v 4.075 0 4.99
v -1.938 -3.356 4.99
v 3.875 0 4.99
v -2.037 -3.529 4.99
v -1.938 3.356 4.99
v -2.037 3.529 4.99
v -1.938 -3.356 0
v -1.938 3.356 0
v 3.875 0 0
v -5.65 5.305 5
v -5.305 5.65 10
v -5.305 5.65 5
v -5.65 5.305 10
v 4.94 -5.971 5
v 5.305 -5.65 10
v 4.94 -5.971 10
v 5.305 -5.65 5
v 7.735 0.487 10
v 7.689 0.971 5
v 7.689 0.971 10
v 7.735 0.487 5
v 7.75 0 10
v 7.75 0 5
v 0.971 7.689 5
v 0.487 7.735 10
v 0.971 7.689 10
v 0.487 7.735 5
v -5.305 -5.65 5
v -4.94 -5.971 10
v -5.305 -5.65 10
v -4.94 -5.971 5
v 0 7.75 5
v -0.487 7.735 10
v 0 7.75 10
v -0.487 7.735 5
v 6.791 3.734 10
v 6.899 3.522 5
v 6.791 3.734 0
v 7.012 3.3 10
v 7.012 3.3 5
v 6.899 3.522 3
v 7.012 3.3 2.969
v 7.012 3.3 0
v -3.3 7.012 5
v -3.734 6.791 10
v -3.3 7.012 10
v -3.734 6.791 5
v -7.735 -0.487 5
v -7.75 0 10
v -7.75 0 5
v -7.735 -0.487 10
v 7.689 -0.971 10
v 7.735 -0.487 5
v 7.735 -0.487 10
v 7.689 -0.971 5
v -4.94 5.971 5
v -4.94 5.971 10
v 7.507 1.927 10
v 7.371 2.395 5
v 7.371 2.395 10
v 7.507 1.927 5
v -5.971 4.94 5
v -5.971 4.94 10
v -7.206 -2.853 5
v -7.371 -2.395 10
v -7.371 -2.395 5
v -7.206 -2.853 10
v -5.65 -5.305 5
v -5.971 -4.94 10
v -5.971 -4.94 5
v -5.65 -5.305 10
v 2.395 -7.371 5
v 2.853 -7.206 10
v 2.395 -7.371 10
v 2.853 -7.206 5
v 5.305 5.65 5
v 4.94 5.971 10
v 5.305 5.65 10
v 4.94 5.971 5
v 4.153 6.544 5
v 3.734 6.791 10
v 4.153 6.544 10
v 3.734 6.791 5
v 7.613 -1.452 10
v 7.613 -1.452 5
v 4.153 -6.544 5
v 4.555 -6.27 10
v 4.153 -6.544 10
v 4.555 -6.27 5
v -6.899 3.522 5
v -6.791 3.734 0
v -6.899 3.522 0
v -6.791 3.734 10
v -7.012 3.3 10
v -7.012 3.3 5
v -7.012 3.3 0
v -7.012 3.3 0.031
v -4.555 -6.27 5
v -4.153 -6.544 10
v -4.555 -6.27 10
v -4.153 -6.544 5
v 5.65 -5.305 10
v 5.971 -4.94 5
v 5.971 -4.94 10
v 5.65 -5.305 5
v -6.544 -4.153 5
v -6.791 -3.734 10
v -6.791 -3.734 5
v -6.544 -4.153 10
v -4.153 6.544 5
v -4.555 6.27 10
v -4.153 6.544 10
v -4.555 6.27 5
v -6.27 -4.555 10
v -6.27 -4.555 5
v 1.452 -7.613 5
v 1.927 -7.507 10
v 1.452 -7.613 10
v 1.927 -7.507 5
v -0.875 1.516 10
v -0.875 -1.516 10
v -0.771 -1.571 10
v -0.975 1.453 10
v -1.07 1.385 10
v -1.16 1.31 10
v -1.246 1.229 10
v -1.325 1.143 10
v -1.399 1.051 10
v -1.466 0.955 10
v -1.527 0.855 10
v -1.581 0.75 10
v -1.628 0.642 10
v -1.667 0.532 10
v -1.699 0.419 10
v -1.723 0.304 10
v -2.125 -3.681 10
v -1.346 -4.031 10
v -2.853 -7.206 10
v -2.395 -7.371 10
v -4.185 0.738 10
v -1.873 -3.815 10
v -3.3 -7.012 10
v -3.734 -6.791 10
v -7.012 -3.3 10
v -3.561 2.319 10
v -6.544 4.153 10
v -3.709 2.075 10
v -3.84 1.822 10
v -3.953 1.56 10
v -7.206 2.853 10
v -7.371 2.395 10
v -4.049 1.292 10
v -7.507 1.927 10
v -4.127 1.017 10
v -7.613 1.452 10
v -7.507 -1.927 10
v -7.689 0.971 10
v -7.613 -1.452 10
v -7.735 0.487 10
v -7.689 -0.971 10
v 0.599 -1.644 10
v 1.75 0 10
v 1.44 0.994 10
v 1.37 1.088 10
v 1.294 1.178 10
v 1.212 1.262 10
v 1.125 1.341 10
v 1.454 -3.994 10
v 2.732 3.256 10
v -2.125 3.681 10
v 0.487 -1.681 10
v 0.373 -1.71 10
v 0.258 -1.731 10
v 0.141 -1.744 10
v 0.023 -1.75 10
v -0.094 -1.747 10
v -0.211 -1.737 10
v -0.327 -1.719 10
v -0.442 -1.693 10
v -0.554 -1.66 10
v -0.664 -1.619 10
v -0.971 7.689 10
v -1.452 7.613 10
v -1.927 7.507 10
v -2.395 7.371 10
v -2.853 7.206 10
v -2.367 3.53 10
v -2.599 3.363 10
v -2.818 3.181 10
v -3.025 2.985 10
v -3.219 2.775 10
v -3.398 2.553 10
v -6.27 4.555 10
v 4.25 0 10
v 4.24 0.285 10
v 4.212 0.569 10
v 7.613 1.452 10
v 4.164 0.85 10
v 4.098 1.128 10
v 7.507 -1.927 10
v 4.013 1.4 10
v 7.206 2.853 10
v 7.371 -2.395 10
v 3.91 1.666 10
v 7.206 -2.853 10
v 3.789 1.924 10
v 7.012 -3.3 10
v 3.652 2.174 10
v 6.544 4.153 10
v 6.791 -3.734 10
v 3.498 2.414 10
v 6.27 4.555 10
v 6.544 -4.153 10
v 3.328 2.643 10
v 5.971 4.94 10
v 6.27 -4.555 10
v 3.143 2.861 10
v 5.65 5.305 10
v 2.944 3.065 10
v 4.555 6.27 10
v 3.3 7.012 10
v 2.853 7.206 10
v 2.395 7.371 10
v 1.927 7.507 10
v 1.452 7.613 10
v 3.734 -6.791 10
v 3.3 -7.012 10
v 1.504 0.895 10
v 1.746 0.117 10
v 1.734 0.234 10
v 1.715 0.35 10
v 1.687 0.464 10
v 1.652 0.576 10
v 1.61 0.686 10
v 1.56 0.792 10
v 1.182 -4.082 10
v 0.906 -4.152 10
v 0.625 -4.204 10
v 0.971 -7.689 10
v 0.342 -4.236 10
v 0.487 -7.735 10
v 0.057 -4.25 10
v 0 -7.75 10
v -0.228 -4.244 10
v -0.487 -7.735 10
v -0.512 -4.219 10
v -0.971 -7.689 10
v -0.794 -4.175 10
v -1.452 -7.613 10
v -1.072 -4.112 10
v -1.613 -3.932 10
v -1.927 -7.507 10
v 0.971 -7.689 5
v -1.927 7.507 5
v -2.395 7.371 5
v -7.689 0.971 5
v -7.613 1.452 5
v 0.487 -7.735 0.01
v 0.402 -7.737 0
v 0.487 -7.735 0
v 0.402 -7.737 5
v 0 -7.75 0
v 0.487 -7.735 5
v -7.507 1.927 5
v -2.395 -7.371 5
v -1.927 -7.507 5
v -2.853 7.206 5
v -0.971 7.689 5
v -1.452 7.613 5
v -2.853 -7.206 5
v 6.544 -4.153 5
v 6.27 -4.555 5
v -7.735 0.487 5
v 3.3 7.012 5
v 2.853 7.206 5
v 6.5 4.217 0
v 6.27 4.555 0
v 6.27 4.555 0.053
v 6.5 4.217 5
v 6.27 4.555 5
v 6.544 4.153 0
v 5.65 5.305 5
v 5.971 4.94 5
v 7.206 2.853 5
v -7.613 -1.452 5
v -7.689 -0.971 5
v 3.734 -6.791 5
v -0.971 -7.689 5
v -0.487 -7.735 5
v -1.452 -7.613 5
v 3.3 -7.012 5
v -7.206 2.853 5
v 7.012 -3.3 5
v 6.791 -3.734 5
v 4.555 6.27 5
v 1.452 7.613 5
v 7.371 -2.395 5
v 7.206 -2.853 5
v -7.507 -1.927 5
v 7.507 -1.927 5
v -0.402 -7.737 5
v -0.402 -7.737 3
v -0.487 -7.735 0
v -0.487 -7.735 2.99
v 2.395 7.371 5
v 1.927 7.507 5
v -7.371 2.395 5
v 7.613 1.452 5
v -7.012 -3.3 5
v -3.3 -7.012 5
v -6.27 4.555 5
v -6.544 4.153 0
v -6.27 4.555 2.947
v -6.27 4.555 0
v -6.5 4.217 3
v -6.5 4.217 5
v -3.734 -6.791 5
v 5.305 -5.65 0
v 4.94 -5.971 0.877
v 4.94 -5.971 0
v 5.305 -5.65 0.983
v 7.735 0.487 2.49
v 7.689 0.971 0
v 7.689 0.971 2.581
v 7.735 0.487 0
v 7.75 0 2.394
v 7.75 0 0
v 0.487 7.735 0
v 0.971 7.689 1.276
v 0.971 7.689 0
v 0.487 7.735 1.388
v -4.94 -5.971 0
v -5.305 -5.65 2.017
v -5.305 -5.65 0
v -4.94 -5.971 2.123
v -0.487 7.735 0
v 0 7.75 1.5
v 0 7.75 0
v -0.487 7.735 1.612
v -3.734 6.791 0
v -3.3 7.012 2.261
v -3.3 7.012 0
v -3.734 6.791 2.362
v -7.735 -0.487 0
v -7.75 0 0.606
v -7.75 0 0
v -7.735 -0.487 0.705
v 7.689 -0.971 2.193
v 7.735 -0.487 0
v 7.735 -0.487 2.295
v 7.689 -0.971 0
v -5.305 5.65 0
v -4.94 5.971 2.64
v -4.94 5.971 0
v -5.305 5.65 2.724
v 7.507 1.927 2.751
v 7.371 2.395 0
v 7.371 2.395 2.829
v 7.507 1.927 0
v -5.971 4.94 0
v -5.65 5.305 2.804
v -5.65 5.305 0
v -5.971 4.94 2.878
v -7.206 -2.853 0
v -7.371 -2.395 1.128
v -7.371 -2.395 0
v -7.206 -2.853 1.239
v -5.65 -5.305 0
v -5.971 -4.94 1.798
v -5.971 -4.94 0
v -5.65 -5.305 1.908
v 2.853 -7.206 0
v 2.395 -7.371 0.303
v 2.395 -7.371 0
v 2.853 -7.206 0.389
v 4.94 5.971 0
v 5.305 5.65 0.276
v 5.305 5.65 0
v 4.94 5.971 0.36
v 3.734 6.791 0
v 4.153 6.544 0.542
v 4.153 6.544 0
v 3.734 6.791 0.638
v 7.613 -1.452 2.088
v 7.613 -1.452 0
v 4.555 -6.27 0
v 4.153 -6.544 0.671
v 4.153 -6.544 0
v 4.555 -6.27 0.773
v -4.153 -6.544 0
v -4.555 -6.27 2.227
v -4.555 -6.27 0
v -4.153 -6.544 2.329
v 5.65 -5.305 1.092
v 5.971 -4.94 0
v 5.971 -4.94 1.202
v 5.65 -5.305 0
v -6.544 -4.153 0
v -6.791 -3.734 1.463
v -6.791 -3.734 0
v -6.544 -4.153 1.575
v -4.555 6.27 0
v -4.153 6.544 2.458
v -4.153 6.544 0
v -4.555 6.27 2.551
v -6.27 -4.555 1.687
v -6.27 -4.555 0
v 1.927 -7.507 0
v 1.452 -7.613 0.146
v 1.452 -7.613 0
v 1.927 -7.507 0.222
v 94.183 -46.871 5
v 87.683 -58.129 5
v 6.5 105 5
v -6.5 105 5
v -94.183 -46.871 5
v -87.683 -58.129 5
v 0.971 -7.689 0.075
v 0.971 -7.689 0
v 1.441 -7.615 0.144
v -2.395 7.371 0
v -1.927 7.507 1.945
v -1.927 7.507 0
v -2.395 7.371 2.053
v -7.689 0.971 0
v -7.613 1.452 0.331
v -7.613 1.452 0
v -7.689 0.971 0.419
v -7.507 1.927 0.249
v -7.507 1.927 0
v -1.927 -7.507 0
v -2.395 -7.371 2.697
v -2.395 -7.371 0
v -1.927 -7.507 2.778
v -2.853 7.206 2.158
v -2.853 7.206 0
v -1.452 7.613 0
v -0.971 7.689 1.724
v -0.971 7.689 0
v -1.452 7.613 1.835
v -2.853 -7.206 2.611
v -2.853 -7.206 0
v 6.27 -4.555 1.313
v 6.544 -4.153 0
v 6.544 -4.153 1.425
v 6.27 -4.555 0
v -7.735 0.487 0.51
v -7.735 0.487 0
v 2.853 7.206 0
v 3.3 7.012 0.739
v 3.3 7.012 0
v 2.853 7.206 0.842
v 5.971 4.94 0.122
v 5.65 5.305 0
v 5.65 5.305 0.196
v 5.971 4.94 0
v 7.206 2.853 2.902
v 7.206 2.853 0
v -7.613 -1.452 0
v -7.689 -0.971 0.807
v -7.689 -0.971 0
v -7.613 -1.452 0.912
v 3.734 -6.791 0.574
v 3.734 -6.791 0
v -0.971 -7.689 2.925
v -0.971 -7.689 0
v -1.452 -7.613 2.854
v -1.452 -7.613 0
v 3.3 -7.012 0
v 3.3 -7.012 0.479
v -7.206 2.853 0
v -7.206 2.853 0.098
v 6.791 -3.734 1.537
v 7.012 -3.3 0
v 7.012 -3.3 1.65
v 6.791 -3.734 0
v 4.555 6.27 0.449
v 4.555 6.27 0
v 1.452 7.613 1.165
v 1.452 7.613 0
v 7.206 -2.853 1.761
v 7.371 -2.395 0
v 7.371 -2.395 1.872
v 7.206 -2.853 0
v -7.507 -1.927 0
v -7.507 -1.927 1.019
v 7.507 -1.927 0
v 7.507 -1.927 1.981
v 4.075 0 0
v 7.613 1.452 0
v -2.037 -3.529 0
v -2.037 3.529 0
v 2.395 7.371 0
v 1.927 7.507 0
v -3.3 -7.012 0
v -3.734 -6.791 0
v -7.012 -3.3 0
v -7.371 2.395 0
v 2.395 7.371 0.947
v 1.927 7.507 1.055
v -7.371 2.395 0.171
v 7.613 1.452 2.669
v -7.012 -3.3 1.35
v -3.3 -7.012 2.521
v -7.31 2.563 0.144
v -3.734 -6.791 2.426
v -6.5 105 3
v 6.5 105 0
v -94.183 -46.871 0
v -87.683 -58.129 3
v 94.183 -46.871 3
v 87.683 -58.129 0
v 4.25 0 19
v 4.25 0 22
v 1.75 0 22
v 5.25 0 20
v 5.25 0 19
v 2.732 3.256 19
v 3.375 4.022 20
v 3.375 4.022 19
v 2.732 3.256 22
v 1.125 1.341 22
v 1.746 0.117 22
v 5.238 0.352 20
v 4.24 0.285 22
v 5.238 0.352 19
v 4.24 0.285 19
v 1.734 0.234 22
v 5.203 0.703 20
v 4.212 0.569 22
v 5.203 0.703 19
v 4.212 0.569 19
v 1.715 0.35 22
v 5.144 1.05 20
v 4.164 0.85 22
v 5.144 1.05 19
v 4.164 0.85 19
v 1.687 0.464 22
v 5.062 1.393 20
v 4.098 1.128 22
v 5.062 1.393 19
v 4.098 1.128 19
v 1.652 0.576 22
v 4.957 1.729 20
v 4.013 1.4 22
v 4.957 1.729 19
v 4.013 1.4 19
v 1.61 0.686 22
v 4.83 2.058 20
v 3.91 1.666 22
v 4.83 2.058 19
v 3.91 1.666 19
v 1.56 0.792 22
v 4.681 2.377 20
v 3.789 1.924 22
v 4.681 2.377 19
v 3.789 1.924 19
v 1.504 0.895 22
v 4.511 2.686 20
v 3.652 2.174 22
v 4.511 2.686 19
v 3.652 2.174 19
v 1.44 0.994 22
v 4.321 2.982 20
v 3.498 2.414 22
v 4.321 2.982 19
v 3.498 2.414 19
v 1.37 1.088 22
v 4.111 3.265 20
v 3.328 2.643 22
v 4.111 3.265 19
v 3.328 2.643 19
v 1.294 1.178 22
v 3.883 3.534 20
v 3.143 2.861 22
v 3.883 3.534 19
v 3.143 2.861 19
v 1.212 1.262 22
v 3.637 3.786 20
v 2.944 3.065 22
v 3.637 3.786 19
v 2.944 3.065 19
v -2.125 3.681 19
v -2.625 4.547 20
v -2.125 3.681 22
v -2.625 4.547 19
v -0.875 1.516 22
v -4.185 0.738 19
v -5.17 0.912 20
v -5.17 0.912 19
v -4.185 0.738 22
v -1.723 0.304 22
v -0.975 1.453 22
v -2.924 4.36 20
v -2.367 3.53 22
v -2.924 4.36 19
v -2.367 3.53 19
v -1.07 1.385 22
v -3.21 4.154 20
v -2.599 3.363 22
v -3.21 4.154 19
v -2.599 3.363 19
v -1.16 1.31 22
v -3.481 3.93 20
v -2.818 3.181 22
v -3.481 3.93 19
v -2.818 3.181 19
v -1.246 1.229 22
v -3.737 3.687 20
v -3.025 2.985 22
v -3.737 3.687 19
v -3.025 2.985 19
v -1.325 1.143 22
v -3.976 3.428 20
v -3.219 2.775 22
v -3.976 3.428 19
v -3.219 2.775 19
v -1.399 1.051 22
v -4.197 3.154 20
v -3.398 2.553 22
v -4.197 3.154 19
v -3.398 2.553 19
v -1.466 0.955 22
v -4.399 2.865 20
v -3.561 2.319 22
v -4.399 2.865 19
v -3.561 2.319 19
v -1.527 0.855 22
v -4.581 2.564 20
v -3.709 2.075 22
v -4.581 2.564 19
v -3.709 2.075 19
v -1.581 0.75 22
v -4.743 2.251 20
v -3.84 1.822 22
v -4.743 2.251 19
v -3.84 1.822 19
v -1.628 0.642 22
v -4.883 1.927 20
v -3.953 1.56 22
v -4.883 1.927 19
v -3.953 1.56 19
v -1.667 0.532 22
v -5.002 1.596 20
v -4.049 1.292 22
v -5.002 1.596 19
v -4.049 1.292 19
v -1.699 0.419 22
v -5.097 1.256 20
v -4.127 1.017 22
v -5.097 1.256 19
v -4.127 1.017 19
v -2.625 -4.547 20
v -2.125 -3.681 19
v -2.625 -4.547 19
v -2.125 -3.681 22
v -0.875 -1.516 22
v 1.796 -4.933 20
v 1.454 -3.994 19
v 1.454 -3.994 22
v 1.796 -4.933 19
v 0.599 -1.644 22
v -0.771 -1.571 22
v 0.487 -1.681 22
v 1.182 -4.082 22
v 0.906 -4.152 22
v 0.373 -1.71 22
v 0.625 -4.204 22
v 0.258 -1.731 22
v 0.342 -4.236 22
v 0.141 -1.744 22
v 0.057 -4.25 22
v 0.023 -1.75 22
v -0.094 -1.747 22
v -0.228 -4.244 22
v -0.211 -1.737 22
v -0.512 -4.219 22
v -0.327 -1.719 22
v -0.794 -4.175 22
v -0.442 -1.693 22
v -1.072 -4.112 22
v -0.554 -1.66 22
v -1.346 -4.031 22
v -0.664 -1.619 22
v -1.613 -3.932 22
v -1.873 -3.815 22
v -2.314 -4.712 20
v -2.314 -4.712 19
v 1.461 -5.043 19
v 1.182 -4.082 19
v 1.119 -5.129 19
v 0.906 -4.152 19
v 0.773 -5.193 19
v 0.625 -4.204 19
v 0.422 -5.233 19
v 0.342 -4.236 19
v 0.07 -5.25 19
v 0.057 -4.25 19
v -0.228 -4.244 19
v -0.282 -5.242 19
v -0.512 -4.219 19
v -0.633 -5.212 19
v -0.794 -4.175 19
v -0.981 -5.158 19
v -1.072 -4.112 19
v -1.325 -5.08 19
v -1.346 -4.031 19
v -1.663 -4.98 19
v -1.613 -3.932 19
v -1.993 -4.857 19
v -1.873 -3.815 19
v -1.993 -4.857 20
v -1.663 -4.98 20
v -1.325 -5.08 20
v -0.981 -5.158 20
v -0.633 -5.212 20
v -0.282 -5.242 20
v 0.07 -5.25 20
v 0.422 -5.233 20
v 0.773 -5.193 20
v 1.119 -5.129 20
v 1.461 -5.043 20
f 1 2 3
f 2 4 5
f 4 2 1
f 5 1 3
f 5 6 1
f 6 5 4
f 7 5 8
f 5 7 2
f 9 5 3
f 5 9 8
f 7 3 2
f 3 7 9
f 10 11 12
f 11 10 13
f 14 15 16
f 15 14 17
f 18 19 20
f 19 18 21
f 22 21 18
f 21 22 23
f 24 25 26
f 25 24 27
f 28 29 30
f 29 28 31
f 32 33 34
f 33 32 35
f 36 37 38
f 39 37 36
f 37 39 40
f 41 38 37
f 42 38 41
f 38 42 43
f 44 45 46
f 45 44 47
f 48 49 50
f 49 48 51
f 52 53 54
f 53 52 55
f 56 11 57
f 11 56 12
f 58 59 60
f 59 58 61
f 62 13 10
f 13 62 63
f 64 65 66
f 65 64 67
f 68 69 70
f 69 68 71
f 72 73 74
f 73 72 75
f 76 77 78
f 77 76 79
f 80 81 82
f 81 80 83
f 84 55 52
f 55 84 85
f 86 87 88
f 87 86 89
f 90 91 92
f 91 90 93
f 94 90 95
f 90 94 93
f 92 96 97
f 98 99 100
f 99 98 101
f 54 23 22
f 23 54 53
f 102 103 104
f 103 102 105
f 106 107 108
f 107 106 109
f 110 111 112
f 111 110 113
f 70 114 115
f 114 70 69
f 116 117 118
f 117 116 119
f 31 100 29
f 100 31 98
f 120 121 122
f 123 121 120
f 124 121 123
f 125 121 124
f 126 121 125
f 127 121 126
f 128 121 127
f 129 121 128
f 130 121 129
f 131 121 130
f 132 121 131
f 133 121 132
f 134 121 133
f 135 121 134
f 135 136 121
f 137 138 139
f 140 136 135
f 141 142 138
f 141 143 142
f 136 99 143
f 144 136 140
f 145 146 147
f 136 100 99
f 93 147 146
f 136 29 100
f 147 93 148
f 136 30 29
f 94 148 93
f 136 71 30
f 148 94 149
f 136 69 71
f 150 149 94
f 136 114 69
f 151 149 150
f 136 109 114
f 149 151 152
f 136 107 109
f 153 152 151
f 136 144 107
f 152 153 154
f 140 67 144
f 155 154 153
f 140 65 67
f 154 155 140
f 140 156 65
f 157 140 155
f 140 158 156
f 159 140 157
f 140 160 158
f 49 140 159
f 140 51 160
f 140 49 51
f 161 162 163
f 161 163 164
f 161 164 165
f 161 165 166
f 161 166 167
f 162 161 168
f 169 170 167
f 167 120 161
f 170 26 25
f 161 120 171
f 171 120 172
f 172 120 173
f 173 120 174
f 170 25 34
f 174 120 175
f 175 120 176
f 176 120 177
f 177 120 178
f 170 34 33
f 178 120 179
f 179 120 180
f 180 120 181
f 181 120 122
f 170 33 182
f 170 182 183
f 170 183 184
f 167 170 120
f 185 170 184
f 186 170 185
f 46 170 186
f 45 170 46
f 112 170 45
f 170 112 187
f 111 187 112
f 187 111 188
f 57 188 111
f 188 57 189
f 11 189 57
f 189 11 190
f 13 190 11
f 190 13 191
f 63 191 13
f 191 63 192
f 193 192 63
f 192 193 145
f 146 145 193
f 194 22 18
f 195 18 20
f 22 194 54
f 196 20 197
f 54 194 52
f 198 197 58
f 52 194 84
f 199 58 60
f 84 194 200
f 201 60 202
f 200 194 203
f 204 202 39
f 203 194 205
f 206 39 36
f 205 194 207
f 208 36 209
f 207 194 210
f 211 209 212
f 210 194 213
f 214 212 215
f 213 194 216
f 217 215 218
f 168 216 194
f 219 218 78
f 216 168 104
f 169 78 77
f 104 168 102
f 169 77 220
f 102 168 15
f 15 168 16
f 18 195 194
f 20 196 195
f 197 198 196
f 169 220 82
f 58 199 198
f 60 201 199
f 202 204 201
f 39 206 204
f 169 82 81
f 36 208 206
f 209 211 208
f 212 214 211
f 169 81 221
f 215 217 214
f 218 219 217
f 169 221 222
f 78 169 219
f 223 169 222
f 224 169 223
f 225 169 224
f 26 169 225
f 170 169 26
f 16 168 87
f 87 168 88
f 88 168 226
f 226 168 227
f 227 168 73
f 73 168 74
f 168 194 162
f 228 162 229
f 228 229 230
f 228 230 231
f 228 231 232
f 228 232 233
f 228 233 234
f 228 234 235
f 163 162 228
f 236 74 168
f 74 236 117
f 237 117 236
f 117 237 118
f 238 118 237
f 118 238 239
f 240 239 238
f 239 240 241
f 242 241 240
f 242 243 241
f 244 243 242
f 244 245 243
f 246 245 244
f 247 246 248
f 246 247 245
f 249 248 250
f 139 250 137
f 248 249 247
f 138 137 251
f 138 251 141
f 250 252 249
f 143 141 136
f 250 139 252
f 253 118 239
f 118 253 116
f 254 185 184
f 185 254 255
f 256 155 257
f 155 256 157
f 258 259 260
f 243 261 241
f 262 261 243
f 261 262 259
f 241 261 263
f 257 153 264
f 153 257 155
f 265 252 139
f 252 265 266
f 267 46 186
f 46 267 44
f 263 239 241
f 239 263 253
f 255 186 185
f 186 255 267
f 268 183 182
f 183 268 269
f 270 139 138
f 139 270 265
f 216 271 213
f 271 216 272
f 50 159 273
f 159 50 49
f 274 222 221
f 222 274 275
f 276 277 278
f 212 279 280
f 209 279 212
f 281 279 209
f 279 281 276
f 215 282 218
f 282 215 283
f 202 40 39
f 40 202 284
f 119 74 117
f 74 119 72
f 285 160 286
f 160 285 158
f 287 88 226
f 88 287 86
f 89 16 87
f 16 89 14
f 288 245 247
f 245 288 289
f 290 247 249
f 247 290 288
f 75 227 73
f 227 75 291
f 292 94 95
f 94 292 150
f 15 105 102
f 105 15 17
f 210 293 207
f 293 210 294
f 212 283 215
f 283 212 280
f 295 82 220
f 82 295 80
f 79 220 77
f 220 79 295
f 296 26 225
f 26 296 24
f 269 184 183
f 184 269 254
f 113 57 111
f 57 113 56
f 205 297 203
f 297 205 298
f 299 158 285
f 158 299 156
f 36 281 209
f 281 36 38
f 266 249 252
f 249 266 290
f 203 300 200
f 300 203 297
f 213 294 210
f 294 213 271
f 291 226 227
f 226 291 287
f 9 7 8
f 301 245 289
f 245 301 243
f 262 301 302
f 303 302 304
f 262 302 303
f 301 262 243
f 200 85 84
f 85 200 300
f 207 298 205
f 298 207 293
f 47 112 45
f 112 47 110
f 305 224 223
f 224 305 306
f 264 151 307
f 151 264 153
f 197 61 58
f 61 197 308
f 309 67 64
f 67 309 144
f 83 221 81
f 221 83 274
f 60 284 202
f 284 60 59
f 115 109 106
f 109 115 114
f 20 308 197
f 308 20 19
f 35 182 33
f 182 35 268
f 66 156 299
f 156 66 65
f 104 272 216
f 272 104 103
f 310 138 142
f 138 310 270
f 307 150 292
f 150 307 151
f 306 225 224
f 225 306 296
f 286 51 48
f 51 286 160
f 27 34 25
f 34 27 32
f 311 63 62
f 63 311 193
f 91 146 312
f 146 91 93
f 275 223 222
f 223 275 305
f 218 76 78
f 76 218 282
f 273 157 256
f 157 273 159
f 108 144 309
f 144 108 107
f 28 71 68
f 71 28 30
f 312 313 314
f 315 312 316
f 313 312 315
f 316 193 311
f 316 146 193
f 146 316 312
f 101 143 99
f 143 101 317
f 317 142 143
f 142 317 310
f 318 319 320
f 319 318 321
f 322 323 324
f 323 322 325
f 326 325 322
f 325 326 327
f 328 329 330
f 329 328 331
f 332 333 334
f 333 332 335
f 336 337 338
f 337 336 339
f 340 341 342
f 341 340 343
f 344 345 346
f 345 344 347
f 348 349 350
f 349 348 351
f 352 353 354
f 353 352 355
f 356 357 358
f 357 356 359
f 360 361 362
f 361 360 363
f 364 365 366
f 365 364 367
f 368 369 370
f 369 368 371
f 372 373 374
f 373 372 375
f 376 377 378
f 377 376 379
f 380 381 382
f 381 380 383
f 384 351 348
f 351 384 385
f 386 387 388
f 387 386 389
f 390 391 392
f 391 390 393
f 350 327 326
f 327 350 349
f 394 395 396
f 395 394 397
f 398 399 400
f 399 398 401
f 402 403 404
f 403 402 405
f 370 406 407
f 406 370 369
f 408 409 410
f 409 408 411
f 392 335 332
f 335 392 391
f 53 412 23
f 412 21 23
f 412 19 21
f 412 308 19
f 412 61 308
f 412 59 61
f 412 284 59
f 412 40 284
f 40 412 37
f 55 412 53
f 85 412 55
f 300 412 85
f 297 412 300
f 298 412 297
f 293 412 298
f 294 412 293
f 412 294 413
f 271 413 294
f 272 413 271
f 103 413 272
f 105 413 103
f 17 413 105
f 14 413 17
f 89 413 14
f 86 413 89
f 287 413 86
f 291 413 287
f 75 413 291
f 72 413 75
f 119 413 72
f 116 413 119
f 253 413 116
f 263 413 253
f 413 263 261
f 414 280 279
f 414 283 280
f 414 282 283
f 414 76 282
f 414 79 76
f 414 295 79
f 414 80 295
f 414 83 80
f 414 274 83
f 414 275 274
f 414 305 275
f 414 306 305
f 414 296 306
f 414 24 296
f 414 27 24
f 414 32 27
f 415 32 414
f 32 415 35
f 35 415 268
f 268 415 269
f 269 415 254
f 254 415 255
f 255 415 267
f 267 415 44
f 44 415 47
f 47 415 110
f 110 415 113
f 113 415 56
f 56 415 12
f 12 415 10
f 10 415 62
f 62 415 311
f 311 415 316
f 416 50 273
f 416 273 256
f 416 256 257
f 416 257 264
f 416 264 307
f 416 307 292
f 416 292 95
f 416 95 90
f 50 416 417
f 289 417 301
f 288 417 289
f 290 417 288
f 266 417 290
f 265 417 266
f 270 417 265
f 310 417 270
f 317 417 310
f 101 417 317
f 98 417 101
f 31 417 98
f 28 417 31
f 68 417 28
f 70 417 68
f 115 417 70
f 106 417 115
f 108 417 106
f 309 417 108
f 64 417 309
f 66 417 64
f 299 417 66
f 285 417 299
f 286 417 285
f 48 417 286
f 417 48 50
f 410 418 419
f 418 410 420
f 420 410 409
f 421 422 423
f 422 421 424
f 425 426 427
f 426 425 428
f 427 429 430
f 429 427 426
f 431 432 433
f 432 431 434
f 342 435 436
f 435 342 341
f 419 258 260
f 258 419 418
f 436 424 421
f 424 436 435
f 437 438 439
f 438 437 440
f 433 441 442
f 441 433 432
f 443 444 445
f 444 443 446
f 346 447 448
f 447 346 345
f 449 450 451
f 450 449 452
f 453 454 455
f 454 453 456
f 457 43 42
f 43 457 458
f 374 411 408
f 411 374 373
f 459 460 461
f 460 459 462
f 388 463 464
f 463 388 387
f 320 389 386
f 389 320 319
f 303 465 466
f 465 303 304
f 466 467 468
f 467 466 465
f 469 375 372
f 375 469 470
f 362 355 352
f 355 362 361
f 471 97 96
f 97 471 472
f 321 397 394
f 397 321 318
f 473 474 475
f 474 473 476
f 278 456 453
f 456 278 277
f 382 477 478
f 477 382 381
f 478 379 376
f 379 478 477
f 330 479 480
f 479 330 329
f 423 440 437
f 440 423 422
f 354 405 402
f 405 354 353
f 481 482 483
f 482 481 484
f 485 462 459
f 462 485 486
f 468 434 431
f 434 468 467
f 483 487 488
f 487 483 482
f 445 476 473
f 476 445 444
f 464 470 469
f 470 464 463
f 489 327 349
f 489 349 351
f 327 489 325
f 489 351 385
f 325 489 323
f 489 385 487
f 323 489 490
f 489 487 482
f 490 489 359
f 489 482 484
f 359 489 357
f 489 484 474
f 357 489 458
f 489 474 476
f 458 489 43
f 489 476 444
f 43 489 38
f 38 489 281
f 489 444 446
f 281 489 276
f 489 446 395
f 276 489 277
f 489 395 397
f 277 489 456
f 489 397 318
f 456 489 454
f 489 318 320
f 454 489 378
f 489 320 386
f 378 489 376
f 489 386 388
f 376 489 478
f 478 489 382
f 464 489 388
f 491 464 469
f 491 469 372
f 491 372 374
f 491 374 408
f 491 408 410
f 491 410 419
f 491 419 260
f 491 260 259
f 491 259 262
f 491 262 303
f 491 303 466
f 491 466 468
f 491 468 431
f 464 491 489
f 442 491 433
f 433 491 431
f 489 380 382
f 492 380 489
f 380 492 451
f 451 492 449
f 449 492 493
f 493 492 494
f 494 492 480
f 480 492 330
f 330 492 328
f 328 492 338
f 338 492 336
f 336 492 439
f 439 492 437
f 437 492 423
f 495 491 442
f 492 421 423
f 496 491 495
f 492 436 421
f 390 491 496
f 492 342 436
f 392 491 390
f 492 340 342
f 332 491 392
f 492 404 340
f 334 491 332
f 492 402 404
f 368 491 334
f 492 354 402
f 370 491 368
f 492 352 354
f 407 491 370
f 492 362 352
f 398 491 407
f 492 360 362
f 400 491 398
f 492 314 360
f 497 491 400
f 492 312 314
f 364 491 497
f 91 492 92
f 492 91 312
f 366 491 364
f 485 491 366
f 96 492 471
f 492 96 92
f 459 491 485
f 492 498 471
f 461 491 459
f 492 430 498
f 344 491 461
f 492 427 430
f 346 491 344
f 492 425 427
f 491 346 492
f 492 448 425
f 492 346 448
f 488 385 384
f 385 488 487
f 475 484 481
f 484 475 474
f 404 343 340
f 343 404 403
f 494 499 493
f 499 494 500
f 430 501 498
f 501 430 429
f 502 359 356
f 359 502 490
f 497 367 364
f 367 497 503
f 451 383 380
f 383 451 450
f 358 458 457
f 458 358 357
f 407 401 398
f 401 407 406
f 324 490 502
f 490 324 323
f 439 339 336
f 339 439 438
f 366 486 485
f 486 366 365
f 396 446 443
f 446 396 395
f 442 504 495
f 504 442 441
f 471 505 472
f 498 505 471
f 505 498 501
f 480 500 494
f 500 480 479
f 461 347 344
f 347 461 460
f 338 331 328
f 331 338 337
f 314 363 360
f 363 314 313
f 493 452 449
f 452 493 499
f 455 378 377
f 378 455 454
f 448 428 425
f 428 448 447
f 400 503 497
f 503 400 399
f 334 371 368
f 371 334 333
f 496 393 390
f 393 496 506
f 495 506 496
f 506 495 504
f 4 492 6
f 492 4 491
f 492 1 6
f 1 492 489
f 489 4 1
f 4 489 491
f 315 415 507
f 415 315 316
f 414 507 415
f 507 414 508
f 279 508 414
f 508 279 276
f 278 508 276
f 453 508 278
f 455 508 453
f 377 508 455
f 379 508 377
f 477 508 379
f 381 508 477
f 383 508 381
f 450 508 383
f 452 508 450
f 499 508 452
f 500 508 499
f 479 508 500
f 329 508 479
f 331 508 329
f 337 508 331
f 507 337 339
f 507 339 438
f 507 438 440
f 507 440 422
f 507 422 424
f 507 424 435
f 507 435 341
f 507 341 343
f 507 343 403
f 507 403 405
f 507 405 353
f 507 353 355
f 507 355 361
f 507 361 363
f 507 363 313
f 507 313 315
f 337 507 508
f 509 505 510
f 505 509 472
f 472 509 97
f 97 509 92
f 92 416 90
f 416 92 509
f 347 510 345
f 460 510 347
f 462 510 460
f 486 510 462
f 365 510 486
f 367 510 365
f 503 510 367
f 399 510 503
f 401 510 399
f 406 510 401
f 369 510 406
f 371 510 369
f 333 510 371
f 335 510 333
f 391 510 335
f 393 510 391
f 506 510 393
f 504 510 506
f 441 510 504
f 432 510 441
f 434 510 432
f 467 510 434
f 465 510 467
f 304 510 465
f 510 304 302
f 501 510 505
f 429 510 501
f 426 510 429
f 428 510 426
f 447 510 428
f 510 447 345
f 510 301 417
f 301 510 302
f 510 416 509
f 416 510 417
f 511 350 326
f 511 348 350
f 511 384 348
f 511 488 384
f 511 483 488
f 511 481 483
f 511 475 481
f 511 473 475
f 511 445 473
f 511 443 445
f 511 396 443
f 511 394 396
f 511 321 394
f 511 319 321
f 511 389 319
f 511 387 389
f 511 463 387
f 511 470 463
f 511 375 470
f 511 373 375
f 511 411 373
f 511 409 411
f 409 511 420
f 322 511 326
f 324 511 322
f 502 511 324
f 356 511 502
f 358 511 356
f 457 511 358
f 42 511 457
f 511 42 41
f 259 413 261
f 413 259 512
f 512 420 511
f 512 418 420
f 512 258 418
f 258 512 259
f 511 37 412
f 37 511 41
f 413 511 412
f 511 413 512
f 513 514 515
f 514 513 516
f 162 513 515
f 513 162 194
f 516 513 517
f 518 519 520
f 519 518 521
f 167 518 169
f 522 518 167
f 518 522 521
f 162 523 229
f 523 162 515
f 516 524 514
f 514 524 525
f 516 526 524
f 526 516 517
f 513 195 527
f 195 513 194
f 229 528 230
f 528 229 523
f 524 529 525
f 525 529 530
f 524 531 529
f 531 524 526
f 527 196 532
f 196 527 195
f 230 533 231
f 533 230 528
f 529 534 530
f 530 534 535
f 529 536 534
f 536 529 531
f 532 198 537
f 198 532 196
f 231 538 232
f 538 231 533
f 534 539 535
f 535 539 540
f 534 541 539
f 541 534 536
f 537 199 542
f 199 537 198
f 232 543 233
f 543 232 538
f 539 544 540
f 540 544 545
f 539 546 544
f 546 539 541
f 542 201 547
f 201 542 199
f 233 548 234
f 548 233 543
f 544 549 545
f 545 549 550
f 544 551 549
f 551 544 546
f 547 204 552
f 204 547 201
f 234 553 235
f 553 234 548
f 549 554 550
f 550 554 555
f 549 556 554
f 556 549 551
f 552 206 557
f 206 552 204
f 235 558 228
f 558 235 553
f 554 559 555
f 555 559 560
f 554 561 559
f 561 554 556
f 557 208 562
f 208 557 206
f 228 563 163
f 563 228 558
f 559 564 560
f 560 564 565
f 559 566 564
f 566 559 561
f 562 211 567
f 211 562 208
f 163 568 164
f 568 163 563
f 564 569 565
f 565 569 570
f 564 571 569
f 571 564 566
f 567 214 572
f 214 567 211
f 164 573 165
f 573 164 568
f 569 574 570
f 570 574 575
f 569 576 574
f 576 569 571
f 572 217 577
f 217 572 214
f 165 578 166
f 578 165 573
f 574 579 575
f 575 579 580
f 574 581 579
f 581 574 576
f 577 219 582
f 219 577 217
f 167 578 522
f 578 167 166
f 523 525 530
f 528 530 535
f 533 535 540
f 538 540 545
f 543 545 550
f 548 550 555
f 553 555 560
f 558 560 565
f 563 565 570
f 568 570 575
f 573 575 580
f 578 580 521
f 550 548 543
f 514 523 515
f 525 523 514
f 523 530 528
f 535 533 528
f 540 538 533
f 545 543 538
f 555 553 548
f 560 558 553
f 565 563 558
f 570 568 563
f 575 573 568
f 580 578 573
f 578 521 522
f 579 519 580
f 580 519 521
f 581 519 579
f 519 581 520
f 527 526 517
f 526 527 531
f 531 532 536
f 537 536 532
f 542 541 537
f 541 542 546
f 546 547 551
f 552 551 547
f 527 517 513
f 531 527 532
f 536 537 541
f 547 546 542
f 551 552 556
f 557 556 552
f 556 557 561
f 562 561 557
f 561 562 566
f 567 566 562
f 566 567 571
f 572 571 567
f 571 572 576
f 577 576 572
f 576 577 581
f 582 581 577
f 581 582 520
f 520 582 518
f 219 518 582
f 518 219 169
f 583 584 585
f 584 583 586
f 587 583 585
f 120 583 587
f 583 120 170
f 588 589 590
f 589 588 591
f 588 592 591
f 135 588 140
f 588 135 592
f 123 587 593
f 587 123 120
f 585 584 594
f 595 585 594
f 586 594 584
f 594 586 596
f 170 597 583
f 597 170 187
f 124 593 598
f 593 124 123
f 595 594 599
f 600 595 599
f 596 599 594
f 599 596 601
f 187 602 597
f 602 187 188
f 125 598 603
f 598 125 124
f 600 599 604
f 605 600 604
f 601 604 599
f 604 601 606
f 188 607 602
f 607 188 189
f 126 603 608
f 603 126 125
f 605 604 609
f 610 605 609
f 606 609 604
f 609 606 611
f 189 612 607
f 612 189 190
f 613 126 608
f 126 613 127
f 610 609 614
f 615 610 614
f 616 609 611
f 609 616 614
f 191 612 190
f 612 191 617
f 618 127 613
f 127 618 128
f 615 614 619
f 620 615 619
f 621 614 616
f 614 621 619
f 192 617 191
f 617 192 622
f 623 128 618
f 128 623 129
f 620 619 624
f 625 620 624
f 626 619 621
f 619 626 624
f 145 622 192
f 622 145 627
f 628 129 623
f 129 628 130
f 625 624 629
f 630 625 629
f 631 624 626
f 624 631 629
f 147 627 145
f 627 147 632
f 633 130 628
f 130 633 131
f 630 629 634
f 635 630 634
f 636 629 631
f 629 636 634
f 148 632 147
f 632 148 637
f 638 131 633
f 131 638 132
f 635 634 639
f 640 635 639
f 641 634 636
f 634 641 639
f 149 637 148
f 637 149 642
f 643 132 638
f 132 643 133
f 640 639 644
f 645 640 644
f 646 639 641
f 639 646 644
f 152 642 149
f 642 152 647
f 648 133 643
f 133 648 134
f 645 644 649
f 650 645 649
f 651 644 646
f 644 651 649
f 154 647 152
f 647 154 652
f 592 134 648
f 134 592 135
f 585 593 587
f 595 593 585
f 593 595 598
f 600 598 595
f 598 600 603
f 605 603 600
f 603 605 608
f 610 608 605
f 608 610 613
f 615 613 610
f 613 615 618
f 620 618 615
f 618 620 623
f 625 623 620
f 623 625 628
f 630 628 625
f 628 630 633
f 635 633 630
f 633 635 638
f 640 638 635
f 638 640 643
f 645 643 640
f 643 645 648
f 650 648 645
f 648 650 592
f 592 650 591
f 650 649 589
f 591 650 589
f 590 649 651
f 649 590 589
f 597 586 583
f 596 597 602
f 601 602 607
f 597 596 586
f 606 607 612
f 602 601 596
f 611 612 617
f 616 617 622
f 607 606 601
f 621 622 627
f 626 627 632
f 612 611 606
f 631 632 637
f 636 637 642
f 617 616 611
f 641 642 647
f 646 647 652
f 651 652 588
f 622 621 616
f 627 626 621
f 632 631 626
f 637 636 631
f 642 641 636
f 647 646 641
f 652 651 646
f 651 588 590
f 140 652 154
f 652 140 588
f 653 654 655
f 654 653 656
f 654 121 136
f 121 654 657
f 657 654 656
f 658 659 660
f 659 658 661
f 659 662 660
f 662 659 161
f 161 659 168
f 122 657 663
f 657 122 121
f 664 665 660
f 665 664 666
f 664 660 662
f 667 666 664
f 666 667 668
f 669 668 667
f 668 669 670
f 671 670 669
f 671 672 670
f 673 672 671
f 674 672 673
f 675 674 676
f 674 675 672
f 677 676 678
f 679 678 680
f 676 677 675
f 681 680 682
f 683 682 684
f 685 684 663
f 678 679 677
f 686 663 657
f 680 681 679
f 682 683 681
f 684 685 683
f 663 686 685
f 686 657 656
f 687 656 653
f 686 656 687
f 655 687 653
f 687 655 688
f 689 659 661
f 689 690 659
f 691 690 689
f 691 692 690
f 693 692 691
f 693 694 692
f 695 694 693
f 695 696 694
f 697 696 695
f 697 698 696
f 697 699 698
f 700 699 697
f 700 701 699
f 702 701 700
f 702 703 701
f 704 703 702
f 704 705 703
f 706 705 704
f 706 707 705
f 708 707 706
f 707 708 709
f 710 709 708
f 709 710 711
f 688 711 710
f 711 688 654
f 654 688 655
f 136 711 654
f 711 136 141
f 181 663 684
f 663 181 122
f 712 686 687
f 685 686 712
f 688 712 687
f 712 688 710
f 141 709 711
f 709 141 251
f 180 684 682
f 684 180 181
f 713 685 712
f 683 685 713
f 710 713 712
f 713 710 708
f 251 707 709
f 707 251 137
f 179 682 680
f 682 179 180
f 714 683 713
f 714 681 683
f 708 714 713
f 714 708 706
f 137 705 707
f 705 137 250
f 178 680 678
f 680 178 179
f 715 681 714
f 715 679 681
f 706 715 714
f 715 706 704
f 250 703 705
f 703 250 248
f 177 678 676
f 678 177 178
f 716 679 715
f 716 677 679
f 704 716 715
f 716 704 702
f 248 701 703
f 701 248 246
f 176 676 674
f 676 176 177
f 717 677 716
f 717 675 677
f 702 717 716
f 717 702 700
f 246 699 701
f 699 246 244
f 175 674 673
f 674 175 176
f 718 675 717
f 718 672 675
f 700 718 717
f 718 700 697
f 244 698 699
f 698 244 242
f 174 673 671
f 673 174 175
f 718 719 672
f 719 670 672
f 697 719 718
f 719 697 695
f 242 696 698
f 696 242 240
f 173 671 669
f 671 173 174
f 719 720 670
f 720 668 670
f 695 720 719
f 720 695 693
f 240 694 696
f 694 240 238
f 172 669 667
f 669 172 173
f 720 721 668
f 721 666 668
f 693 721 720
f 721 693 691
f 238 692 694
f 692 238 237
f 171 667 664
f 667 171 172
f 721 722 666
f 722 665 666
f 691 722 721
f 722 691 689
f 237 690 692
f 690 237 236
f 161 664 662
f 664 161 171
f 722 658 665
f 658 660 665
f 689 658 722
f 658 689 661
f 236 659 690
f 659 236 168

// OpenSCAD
$fn = 100;

insert_diameter = 8.5;
insert_wall = 2.5;
insert_notch = 3.5;
insert_notch_height = 3;
insert_height = 12;

insert_top = 15.5;
insert_top_height = 10;

blade_length = 105;
blade_width = 13;
blade_thick_1 = 5;
blade_thick_2 = 3;

difference(){
  cylinder(d=insert_top, h=insert_top_height);
  translate([0,0,-0.01]) {
    difference() {
      cylinder(d=insert_top+1, h=insert_top_height/2);
      cylinder(d=insert_top/2, h=insert_top_height/2, $fn=3);
    }
  }
}

module notch() {
translate([0, 0, insert_top_height])
rotate_extrude(angle=50)
translate([insert_diameter/2-insert_wall, 0, 0])
polygon([[0, 0], [0, insert_height], [insert_wall, insert_height], [insert_notch, insert_height-(insert_notch_height/1.5)], [insert_notch, insert_height-insert_notch_height], [insert_wall, insert_height-insert_notch_height], [insert_wall, 0]]);
}

notch();
rotate([0, 0, 120]) notch();
rotate([0, 0, 240]) notch();

module blade(rotation = 0) {
  difference(){
  rotate([-90, 180, rotation]) {
    translate([-blade_width/2, 0, 0]) {
      linear_extrude(height=blade_length) {
        polygon([[0, 0], [0, blade_thick_1], [blade_width, blade_thick_1], [blade_width, blade_thick_2]]);
      }
    }
  }
  cylinder(d=insert_top/2+0.4, h=insert_top_height/2+0.02, $fn=3);
  }
}
//translate([0,0,-10])
difference() {
  cylinder(d=insert_top, h=insert_top_height/2);
  translate([0, 0, -0.01])
  cylinder(d=insert_top/2+0.4, h=insert_top_height/2+0.02, $fn=3);
}
blade();
blade(120);
blade(240);
